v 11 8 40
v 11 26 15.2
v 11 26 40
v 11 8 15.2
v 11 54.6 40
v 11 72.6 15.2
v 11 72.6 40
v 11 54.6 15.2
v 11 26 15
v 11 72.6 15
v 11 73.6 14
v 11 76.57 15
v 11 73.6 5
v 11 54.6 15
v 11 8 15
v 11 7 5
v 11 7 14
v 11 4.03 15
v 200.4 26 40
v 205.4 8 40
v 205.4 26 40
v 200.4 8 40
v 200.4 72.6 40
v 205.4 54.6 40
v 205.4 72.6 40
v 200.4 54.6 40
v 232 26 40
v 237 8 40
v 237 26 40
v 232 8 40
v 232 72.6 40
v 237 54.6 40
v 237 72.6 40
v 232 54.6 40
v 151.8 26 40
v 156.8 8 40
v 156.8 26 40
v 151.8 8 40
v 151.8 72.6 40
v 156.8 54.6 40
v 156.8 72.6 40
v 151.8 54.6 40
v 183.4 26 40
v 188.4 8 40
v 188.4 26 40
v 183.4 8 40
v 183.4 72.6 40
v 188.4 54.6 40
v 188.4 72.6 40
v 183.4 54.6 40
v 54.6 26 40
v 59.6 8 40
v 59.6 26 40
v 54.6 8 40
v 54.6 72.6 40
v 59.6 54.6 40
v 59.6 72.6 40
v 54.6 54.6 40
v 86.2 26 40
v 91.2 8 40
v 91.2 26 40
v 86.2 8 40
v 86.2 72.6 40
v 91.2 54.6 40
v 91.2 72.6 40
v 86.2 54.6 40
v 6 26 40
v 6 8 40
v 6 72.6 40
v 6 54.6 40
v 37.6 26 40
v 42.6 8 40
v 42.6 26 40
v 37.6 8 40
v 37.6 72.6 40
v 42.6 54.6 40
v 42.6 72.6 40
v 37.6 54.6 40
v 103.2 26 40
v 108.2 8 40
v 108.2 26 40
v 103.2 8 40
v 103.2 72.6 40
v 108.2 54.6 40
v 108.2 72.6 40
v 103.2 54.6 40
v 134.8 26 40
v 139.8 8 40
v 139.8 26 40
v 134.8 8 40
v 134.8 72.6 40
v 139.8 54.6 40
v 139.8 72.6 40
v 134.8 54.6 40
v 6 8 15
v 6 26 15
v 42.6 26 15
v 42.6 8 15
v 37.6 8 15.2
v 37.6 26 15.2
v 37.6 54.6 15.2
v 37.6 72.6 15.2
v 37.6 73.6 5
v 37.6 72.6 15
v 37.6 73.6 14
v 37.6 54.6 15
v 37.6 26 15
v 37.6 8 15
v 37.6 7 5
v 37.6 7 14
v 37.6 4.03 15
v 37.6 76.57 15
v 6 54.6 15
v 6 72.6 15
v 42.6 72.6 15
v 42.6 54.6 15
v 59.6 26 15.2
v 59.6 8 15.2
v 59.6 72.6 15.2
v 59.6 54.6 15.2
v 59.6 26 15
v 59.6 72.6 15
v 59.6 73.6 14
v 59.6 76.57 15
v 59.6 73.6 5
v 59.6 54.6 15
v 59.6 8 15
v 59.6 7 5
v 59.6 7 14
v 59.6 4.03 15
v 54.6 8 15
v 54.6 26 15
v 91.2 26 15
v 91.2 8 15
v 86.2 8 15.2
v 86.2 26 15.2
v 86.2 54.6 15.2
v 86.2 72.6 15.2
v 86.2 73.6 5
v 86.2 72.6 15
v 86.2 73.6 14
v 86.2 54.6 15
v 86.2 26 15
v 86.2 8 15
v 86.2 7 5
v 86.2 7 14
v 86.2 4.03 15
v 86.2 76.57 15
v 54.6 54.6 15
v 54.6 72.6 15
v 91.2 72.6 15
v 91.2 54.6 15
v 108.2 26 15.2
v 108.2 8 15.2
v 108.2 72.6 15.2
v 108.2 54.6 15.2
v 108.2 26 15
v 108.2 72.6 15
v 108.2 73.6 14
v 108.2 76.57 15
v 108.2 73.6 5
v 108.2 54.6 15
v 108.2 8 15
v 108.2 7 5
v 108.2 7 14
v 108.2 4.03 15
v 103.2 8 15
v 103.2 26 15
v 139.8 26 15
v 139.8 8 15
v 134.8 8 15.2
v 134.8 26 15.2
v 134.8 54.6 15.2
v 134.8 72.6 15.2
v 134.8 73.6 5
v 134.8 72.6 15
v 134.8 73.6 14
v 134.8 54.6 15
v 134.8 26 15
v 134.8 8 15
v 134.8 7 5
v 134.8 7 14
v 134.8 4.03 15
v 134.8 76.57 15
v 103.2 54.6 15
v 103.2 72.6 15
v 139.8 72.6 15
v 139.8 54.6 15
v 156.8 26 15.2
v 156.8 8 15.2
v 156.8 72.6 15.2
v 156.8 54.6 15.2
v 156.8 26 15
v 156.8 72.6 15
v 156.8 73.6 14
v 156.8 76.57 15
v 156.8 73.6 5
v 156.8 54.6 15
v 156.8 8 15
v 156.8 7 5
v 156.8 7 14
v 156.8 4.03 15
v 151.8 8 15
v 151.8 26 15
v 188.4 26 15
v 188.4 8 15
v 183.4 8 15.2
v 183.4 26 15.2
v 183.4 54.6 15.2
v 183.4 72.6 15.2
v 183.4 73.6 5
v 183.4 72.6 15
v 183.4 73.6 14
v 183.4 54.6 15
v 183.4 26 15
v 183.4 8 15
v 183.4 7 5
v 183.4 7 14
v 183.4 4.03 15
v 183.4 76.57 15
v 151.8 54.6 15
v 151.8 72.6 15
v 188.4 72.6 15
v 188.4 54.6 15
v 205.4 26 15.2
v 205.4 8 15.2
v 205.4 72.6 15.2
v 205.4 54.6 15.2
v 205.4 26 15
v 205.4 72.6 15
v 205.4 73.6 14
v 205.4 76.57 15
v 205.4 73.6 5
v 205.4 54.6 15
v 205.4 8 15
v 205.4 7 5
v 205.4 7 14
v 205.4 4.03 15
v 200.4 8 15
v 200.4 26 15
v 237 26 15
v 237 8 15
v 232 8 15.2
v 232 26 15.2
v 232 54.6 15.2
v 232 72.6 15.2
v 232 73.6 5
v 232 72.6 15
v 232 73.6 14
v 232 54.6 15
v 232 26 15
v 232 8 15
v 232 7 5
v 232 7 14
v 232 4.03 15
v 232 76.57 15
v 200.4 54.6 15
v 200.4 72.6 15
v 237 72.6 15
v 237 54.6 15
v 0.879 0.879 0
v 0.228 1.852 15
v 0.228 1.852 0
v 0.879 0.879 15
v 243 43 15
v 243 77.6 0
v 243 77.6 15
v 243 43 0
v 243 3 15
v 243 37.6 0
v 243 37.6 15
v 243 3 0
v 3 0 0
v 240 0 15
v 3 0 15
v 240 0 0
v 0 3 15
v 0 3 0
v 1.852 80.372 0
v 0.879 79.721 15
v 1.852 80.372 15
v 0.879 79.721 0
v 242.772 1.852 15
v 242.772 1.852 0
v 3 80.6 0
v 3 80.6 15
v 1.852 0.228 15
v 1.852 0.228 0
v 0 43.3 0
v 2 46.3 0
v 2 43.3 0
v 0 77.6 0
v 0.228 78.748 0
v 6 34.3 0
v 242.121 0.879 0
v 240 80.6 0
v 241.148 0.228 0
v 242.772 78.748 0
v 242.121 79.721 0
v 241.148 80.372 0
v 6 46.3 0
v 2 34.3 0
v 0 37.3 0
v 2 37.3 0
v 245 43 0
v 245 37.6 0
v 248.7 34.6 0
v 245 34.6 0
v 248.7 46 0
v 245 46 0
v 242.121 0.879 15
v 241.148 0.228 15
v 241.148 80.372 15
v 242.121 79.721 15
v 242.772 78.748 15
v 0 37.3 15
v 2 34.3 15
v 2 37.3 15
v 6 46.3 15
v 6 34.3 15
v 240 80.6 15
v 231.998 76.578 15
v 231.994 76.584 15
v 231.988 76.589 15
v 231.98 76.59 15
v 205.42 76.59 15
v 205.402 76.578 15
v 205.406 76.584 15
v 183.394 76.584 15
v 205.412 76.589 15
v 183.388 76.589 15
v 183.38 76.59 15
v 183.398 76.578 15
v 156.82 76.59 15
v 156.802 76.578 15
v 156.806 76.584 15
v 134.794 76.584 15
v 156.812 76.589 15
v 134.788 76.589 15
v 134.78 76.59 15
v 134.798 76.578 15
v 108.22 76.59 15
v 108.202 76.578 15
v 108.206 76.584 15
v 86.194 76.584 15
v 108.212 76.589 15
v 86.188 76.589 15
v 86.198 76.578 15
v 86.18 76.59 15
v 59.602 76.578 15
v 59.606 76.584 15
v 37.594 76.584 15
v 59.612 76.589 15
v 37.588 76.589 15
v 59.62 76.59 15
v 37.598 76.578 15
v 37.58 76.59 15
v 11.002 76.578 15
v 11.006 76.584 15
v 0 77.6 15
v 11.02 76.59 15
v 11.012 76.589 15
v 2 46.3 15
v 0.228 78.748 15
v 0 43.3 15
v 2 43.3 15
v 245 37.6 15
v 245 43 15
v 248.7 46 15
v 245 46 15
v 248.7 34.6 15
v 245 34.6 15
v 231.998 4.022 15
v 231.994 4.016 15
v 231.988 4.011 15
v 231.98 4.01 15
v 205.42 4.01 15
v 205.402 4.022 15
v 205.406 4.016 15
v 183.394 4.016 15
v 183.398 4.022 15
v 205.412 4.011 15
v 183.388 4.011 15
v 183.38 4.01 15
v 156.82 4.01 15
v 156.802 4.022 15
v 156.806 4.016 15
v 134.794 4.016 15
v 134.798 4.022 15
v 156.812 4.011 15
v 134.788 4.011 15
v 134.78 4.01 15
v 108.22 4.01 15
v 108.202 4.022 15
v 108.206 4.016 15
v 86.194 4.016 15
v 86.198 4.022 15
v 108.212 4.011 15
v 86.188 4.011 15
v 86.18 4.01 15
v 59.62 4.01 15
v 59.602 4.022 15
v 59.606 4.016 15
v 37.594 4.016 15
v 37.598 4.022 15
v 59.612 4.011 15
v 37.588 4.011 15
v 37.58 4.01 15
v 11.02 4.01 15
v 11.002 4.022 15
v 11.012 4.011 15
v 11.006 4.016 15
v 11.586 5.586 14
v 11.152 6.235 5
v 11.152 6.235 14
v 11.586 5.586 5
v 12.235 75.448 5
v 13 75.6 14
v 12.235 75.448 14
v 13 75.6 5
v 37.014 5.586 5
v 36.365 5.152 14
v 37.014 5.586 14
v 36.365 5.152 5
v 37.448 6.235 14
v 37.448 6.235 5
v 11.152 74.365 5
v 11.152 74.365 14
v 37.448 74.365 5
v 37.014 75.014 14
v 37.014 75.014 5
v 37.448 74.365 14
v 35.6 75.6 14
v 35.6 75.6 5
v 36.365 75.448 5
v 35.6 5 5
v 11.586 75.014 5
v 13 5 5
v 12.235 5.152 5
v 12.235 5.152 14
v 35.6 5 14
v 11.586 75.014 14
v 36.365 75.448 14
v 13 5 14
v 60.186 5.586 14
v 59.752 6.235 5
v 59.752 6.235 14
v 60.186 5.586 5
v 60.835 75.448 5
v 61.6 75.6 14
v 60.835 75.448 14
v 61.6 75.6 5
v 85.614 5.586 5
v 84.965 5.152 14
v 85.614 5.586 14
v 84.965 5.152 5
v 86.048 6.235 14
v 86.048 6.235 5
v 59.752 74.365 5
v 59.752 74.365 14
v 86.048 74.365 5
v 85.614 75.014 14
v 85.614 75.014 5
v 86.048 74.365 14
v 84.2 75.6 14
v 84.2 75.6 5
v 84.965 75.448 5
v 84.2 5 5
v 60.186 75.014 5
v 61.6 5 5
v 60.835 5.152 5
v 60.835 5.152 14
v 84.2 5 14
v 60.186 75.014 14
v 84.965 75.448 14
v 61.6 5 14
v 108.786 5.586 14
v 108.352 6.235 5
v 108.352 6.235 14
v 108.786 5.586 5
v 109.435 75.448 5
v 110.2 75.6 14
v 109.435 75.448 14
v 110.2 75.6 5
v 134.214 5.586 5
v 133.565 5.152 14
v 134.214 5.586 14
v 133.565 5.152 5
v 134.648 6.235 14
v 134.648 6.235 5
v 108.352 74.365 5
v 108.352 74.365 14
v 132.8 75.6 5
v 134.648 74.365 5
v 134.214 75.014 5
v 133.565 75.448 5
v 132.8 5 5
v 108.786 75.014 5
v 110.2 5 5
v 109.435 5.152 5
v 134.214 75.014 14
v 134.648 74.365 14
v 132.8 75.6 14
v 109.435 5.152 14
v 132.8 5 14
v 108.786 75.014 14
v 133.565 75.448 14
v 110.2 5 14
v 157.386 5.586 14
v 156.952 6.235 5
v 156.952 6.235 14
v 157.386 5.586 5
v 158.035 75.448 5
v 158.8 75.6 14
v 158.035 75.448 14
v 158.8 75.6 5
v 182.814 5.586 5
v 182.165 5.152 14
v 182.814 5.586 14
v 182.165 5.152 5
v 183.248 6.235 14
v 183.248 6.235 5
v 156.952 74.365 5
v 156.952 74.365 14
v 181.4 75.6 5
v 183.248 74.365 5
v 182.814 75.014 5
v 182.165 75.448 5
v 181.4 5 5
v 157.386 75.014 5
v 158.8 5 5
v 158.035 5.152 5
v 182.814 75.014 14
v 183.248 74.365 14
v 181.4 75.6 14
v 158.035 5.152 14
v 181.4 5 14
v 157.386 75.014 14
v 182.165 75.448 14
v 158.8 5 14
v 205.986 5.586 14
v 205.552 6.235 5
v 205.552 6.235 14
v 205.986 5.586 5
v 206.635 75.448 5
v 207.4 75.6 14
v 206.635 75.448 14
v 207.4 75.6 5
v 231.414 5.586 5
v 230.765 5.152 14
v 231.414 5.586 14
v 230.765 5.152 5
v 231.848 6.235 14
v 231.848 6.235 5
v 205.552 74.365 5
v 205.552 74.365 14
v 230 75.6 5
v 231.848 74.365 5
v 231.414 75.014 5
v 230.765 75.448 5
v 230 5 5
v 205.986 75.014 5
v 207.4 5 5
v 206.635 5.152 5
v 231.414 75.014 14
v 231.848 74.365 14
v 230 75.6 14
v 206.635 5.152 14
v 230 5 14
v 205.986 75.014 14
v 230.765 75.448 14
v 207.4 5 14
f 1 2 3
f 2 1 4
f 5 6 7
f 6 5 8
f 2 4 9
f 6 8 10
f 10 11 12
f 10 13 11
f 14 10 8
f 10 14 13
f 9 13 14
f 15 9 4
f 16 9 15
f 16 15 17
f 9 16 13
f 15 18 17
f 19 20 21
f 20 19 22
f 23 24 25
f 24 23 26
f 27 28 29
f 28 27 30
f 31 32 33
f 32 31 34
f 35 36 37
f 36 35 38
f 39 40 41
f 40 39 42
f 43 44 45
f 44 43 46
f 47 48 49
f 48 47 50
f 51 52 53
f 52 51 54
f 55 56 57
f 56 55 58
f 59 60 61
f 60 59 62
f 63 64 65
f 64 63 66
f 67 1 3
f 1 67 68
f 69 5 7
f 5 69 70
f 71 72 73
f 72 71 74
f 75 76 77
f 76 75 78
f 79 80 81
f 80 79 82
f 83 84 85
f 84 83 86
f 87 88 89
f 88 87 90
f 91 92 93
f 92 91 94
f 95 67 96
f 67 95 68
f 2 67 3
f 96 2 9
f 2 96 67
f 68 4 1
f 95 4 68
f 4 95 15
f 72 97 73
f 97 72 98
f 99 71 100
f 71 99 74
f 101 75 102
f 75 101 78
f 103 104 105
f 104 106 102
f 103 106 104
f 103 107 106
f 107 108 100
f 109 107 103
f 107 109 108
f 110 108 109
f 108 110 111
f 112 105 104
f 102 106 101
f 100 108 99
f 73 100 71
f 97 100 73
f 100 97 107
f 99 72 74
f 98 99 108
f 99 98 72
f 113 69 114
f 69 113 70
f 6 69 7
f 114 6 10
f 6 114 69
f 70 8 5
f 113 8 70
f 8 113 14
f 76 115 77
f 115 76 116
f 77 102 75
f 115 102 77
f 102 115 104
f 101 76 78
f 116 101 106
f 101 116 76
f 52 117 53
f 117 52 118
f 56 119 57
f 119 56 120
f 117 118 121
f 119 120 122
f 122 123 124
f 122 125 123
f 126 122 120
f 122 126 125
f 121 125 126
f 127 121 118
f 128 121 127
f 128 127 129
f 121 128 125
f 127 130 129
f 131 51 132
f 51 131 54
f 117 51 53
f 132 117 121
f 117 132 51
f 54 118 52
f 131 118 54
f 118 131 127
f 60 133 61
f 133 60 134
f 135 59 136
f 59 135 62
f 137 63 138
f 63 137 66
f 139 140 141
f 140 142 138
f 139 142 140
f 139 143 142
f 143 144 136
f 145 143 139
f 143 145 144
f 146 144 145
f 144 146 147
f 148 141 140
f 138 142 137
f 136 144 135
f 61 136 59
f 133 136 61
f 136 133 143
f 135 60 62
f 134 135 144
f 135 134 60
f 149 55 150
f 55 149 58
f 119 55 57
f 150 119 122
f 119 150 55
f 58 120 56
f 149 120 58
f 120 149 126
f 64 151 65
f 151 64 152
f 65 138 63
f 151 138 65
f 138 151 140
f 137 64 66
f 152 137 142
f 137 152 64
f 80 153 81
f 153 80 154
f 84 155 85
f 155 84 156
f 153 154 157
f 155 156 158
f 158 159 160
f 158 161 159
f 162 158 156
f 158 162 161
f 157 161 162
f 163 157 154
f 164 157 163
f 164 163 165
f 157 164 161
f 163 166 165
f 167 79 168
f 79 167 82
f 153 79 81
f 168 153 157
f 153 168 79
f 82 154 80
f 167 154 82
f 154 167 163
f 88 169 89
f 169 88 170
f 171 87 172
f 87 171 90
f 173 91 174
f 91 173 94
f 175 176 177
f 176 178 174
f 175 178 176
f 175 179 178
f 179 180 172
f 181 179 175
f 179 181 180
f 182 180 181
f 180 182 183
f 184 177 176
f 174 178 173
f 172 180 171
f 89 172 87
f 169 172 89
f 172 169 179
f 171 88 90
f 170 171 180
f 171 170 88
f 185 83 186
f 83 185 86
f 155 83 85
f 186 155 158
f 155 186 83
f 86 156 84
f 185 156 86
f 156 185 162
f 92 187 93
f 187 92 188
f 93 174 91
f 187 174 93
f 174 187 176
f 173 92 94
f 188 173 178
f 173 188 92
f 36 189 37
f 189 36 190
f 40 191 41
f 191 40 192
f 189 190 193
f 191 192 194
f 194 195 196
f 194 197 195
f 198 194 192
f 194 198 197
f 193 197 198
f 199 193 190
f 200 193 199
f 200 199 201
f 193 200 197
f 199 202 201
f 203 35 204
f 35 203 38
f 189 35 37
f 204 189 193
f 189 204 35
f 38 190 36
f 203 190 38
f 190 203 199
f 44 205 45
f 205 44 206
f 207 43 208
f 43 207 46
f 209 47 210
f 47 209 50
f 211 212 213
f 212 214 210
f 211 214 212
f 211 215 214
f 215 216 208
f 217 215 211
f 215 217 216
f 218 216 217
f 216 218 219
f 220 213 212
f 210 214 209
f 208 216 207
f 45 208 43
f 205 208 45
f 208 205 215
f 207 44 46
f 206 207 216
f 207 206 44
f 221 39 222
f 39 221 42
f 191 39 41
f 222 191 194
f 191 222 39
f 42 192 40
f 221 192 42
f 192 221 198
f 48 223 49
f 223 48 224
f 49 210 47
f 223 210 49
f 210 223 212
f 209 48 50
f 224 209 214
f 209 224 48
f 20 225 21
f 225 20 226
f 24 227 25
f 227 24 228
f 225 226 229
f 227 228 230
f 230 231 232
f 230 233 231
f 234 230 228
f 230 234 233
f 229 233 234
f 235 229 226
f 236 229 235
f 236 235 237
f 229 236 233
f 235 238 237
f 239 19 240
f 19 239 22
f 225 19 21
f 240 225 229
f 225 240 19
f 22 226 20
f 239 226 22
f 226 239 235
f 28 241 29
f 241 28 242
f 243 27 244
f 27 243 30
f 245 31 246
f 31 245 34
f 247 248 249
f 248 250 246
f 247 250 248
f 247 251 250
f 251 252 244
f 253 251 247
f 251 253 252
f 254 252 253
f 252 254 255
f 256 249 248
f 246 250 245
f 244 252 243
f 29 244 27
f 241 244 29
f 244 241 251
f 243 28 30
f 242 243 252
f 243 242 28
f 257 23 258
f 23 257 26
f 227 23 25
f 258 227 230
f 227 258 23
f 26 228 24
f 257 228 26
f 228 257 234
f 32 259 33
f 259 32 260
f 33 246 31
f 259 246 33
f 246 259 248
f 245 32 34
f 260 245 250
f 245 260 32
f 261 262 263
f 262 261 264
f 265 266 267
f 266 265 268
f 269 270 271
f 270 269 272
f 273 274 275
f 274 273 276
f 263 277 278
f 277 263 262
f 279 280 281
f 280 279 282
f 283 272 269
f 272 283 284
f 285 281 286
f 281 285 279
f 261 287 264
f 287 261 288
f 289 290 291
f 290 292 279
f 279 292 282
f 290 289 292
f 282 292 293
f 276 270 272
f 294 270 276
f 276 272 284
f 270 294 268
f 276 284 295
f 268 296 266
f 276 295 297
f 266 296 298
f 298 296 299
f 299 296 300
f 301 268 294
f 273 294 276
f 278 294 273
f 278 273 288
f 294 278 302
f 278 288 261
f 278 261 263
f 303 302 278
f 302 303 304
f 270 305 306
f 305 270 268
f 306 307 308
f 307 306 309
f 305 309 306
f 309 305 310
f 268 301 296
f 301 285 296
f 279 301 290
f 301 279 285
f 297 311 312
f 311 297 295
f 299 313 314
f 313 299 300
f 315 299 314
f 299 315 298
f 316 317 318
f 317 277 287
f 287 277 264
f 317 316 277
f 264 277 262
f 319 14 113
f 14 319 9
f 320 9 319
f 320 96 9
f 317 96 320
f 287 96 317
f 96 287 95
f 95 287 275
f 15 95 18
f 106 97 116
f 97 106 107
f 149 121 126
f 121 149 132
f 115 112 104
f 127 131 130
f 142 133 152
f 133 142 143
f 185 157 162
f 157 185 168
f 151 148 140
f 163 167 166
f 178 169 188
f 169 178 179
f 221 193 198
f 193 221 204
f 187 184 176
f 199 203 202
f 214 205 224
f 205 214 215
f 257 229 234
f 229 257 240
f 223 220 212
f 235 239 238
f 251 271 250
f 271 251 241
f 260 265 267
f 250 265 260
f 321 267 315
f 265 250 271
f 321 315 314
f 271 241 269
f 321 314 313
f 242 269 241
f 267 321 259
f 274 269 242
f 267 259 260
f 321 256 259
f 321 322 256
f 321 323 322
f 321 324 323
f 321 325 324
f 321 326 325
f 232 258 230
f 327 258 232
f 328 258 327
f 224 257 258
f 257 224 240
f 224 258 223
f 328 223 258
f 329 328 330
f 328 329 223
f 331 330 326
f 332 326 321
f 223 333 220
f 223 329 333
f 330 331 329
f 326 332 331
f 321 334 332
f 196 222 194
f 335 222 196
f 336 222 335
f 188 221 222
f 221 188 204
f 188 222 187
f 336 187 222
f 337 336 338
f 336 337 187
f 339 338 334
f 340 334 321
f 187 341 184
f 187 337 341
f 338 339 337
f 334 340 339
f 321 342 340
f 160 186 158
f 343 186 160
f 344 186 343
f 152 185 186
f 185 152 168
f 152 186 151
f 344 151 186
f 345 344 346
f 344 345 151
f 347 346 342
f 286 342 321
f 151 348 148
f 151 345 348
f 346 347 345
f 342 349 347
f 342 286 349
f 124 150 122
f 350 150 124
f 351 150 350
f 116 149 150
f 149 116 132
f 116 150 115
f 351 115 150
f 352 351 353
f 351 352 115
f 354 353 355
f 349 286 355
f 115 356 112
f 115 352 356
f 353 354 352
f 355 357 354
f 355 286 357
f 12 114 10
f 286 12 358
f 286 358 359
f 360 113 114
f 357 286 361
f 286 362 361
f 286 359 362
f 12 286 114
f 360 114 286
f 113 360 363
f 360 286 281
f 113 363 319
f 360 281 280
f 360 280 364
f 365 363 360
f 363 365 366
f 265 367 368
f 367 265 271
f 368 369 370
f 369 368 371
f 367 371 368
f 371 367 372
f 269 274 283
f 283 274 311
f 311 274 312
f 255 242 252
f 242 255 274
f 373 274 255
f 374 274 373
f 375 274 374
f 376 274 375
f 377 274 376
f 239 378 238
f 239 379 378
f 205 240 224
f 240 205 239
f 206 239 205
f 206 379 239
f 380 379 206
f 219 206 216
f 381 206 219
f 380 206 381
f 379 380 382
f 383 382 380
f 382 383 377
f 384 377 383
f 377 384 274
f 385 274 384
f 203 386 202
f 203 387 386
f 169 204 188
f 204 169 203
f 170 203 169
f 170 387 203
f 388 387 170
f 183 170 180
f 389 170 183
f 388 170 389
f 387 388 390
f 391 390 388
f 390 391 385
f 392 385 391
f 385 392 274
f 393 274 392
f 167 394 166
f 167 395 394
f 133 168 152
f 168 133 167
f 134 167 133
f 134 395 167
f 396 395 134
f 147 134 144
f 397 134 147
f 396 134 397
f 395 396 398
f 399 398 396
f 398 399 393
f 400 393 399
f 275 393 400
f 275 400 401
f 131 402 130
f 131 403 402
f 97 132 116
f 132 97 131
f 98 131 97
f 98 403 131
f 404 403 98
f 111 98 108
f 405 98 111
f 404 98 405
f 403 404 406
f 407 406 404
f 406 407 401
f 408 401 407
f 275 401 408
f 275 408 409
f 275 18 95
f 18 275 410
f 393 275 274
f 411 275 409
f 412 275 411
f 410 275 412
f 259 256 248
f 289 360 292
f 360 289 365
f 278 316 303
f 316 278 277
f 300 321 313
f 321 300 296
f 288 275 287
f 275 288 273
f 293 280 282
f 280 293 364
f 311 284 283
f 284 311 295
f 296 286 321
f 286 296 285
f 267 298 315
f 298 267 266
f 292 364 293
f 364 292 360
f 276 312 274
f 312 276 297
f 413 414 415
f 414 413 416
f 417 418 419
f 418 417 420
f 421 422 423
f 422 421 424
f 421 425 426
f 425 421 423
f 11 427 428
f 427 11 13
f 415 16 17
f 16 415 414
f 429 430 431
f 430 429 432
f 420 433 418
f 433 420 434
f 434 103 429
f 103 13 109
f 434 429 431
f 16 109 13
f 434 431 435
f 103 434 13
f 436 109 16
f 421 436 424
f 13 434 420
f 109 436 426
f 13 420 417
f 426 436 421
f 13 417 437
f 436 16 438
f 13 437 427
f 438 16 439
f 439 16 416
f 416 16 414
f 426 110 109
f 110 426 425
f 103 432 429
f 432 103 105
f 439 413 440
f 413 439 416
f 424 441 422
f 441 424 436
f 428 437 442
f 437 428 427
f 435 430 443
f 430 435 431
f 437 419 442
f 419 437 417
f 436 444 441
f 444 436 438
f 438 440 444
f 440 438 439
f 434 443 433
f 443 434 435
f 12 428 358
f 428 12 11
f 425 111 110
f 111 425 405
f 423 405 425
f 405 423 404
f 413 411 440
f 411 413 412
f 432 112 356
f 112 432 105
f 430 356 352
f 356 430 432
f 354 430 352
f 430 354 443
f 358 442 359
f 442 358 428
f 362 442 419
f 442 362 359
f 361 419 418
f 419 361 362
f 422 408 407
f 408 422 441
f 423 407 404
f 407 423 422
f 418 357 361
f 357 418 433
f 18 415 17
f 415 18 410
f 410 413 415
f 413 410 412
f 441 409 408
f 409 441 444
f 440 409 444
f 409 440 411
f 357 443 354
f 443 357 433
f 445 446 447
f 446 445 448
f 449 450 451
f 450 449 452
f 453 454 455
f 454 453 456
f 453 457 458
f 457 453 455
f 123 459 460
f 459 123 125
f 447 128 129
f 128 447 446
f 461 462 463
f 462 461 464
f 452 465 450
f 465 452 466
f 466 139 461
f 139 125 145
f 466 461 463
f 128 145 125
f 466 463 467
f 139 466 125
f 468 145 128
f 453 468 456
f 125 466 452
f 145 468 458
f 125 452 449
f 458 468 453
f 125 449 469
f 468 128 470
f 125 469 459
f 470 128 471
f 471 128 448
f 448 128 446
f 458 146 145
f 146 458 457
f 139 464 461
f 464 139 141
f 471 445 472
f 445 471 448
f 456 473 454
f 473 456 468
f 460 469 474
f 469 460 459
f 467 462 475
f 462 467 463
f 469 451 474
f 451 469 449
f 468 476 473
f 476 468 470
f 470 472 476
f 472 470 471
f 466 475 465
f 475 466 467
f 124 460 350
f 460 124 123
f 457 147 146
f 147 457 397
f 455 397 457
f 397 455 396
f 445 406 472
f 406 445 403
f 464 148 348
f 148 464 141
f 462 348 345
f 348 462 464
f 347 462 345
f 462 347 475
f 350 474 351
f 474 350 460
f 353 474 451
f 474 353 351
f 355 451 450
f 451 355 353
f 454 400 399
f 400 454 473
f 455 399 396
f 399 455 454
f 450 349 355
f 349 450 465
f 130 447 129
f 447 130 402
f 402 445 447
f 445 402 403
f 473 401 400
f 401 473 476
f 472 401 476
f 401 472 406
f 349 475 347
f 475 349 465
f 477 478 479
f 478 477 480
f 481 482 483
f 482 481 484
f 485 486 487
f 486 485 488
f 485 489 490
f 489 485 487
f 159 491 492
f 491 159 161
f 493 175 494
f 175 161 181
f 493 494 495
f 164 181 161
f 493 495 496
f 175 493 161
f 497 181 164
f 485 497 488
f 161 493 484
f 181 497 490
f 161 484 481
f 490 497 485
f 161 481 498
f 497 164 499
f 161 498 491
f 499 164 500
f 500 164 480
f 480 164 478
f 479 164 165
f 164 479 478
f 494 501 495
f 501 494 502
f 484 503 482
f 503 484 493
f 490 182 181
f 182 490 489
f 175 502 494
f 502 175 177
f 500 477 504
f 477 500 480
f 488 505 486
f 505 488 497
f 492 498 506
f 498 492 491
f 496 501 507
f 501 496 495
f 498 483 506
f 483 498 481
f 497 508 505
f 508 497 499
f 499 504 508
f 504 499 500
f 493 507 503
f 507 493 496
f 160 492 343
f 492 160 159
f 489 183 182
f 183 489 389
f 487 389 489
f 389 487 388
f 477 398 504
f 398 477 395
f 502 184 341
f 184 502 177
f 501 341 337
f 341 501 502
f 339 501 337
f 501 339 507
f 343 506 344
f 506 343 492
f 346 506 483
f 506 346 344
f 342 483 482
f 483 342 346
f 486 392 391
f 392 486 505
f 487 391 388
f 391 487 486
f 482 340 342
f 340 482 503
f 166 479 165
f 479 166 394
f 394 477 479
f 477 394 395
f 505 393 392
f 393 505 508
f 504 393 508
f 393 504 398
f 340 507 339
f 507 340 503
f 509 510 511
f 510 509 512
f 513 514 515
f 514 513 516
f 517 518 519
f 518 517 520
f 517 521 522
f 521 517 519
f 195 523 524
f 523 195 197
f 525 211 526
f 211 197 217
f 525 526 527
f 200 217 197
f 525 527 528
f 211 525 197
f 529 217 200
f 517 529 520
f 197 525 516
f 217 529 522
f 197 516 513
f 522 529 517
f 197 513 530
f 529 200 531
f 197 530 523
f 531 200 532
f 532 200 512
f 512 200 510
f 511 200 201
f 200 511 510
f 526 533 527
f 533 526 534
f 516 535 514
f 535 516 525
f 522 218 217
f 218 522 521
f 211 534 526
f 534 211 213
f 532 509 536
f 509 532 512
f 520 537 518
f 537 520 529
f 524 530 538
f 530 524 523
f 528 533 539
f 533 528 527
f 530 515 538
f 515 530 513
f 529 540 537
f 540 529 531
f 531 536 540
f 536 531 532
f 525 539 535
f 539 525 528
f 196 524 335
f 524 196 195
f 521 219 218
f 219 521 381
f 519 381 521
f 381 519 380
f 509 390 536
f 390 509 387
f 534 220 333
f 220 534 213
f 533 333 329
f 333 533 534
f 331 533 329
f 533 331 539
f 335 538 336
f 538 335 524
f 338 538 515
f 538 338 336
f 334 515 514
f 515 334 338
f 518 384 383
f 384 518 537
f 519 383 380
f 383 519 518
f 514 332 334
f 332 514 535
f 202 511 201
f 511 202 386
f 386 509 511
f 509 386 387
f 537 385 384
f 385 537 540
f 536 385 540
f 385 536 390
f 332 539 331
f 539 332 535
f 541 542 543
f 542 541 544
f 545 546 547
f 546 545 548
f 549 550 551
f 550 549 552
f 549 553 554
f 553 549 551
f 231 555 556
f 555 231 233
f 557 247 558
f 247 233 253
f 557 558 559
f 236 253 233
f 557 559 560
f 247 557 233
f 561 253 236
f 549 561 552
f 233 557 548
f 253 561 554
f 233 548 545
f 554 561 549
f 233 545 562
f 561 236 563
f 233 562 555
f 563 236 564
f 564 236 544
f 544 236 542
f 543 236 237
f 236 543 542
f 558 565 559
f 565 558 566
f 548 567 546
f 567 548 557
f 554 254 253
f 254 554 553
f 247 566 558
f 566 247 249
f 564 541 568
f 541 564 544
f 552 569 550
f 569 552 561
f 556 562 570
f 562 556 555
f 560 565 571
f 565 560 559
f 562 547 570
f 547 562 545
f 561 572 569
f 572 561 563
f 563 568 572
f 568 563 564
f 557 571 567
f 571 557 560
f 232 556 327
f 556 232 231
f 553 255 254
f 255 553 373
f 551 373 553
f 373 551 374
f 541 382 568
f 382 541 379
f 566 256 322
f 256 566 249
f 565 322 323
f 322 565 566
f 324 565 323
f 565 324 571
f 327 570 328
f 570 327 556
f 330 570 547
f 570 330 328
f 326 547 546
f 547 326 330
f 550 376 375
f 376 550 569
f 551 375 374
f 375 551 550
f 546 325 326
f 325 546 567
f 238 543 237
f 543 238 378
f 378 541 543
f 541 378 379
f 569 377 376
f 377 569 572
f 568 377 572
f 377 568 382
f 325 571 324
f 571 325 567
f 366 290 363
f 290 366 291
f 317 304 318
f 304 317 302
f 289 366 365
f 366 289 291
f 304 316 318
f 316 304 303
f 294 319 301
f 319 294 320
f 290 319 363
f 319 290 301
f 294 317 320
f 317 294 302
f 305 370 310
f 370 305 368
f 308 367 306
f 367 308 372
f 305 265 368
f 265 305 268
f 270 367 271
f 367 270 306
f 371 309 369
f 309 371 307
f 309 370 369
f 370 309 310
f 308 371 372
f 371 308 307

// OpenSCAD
// =============================================================
// router_dock.scad  -  Parametric vertical-slot router dock
// Draft v0.6 / units: mm
// Axes: X = slot row direction, Y = slot length, Z = height
// v0.2: SOLID base -> no bridges, no isolated islands, no stringing
// v0.3: + upright fence slats (modes 1/2, superseded)
// v0.4: independent posts, 4 per slot, front/back open;
//       lead-in chamfer only at the Y ends -> zero unsupported faces
// v0.5: slot width +1 mm along X only; separate-key joint coupons
// v0.6: INTEGRAL male/female joint - LEFT end = female T pocket,
//       RIGHT end = male T tenon. No separate key any more.
//       Tenon length is counted INSIDE the 249 mm envelope so the
//       module still fits the P1S 256 mm bed with 7 mm to spare.
// v0.7: UNIFORM PITCH. The seam clear gap equals M_L + M_R and is
//       INDEPENDENT of GAP, so set M_L + M_R = GAP to make the seam as
//       wide as every internal channel. GAP 25 -> 22, margins 8/2 -> 11/11:
//       envelope stays 249 mm, seam 10 -> 22 mm, and the last slot's right
//       posts regain their full 5 mm (right wall 2 -> 11 mm).
// =============================================================

$fn = 16;

// ---- Print mode ----------------------------------------------
SOLID = 1;   // 1 = solid blind slots (default); 0 = legacy grated + feet
VENT  = 0;   // 1 = solid + standoff pads + open end notches (still no bridges)

// ---- Fence posts (v0.4: independent posts) -------------------
FENCE_ON   = 1;
FENCE_MODE = 3;    // 3 = independent posts, 4 per slot  <-- current design
FENCE_T    = 5;    // post thickness (sketch: 0.5 cm = 5 mm)
FENCE_H    = 25;   // post height ABOVE the slot rim plane (sketch: 2.5 cm)
FENCE_L    = 18;   // post length along the slot (~1/4 of slot length)
FENCE_END  = 3;    // gap from the post outer end to the slot end

// ---- Router / slot (UNCONFIRMED, tune after fit test) --------
SLOT_L      = 70;
SLOT_W      = 25;
SLOT_W_ADD  = 1;     // v0.5: widen the slot by 1 mm along X ONLY
CLEARANCE   = 0.3;   // per-side fit clearance (FDM inner walls shrink)
SLOT_DEPTH  = 10;    // insertion depth; hard max 10 (fan intake)
ROUTER_SHOW = 50;    // exposed height used only by the preview mock-up

// ---- Base ----------------------------------------------------
BASE_T       = 5;    // solid floor thickness (sketch: 0.5 cm)
FOOT_H       = 5;    // legacy only
GAP          = 22;   // v0.7: clear gap between slots. Equals M_L + M_R so
                     // the seam is exactly as wide as an internal channel.
                     // Was 25; reducing it keeps the envelope at 249 mm.
N_SLOTS      = 5;
END_MARGIN   = 11;   // LEFT margin, hosts the 6 mm deep female pocket.
                     // Must stay >= T_DEPTH + 2 or the pocket cuts slot 1.
END_MARGIN_R = 11;   // RIGHT margin behind the male tenon. Must stay >=
                     // FENCE_T (5) or the last slot's right posts get clipped
                     // by the body outline (v0.6 had 2 mm -> thin 2 mm posts).
Y_MARGIN     = 5;
CORNER_R     = 2;
CHAMFER      = 1;

// ---- Integral male/female joint (v0.6) -----------------------
// T-shape locks the modules against being pulled apart along X.
// JOINT_LOCK = 0 switches to a plain rectangular tenon, which can be
// pushed in horizontally but has NO mechanical lock (friction only).
JOINT_LOCK = 1;
T_DEPTH    = 6;      // pocket depth / tenon reach
T_NECK_X   = 2;      // narrow mouth length along X
T_NECK_W   = 6;      // narrow mouth width along Y
T_HEAD_W   = 12;     // wide pocket width along Y
JOINT_GAP  = 0.3;    // per-side clearance of the printed male tenon
// NOTE: the female pocket runs all the way down to z=0. A bottom stop
// ledge would force the tenon to start at z=1 and create a downward
// facing unsupported face. Both modules sit flat on the desk instead.

// ---- Joint fit-test coupon -----------------------------------
JT_X = 10;           // 6 mm pocket/tenon + 4 mm backing wall
JT_Y = 28;           // 12 mm joint + 8 mm wall on each side
JT_GAP_Y = 5;        // spacing between the two coupons in one STL

// ---- VENT option (additive pads + open notches, no bridges) --
PAD_H    = 2;
PAD_W    = 4;
NOTCH_W  = 10;

// ---- Derived (do not edit) -----------------------------------
SW      = SLOT_W + SLOT_W_ADD + 2*CLEARANCE;                  // 26.6
SL      = SLOT_L + 2*CLEARANCE;                               // 70.6
PITCH   = SW + GAP;                                           // 48.6
SLOTS_W = N_SLOTS*SW + (N_SLOTS-1)*GAP;                      // 221
SEAM    = END_MARGIN + END_MARGIN_R;                          // 22 == GAP
BODY_W  = END_MARGIN + SLOTS_W + END_MARGIN_R;                // 243
MW      = BODY_W + T_DEPTH;                                   // 249 incl. tenon
MD      = 2*Y_MARGIN + SL;                                    // 80.6
ZBASE   = SOLID == 1 ? 0 : FOOT_H;
ZB      = ZBASE + BASE_T;                                     // 5
ZT      = ZB + SLOT_DEPTH;                                    // 15
ZF      = ZT + (FENCE_ON == 1 ? FENCE_H : 0);                 // 40
CY      = MD/2;
V0W     = 2*END_MARGIN + SW + GAP;                            // 70.6

// 1 = V0 coupon, 2 = full module (default),
// 4 = fit-test coupon pair, 5 = assembled joint demo.
// PART_ID 3 (separate key) was retired in v0.6.
PART_ID = 2;

// ---- 2D rounded rectangle, extruded --------------------------
module rr(w, d, r) {
    q = min(r, min(w, d)/2 - 0.01);
    hull() {
        translate([q,     q])     circle(q);
        translate([w - q, q])     circle(q);
        translate([q,     d - q]) circle(q);
        translate([w - q, d - q]) circle(q);
    }
}

module rr_box(w, d, h, r) {
    linear_extrude(height = h, convexity = 6) rr(w, d, r);
}

// ---- Slot cavity + lead-in chamfer ---------------------------
module slot_cut(x) {
    translate([x, Y_MARGIN, ZB])
        rr_box(SW, SL, SLOT_DEPTH + 0.2, CORNER_R);
    // Lead-in bevel only at the FRONT / BACK ends of the slot (Y).
    // Widening it along X would cut 1 mm into the posts at z=ZT and
    // leave each post with an unsupported horizontal lip.
    hull() {
        translate([x, Y_MARGIN, ZT - CHAMFER])
            rr_box(SW, SL, 0.01, CORNER_R);
        translate([x, Y_MARGIN - CHAMFER, ZT + 0.01])
            cube([SW, SL + 2*CHAMFER, 0.01]);
    }
}

// ---- Legacy only ---------------------------------------------
module grid_holes(x) {
    for (j = [0:2])
        translate([x + 3 + j*7.5, Y_MARGIN + 5, ZBASE - 0.1])
            rr_box(4, SL - 10, BASE_T + 0.4, 1.2);
}

module vented_rails(W) {
    seg = 20; notch = 8;
    for (x = [0 : seg + notch : W]) {
        w = min(seg, W - x);
        if (w > 2) {
            translate([x, 0, 0])     rr_box(w, 5, FOOT_H + 0.1, 1);
            translate([x, MD-5, 0])  rr_box(w, 5, FOOT_H + 0.1, 1);
        }
    }
}

// ---- Upright fence posts -------------------------------------
module fence_post(W, n, x0) {
    for (i = [0 : n-1]) {
        x = x0 + i*PITCH;
        for (y = [Y_MARGIN + FENCE_END,
                  Y_MARGIN + SL - FENCE_END - FENCE_L]) {
            // Start at the slot FLOOR: a post starting at ZT would have a
            // 1 mm unsupported lip above the mouth chamfer.
            translate([x - FENCE_T, y, ZB])
                cube([FENCE_T, FENCE_L, ZT - ZB + FENCE_H]);
            translate([x + SW, y, ZB])
                cube([FENCE_T, FENCE_L, ZT - ZB + FENCE_H]);
        }
    }
}

module fence(W, n, x0) {
    if (FENCE_ON == 1)
        intersection() {
            translate([0, 0, ZB])
                linear_extrude(height = ZT - ZB + FENCE_H, convexity = 6)
                    rr(W, MD, 3);
            union() {
                if (FENCE_MODE == 3) fence_post(W, n, x0);
            }
        }
}

// ---- Female T pocket at the LEFT end face --------------------
// Through Z = 0 .. ZT. No floor ledge (see NOTE above).
module female_pocket(yc = CY) {
    h = ZT + 0.4;
    if (JOINT_LOCK == 1) {
        translate([-0.2, yc - T_NECK_W/2, -0.2])
            cube([T_NECK_X + 0.2, T_NECK_W, h]);
        translate([T_NECK_X, yc - T_HEAD_W/2, -0.2])
            cube([T_DEPTH - T_NECK_X, T_HEAD_W, h]);
    } else {
        translate([-0.2, yc - T_HEAD_W/2, -0.2])
            cube([T_DEPTH + 0.2, T_HEAD_W, h]);
    }
}

// ---- Male T tenon growing from the RIGHT end face ------------
// X = BODY_W .. BODY_W + (T_DEPTH - JOINT_GAP), Z = 0 .. ZT.
// Every layer is attached to the body at X = BODY_W, so there is no
// overhang; no supports and no separate part are needed.
module male_tenon(x0 = BODY_W, yc = CY) {
    g  = JOINT_GAP;
    nw = T_NECK_W - 2*g;    // 5.4
    hw = T_HEAD_W - 2*g;    // 11.4
    L  = T_DEPTH - g;       // 5.7
    if (JOINT_LOCK == 1) {
        translate([x0, yc - nw/2, 0])
            cube([T_NECK_X, nw, ZT]);
        translate([x0 + T_NECK_X, yc - hw/2, 0])
            cube([L - T_NECK_X, hw, ZT]);
    } else {
        translate([x0, yc - hw/2, 0])
            cube([L, hw, ZT]);
    }
}

// ---- VENT option ---------------------------------------------
module standoff_pads(x) {
    for (px = [x + 1.5, x + SW - 1.5 - PAD_W])
        for (py = [Y_MARGIN + 1.5, Y_MARGIN + SL - 1.5 - PAD_W])
            translate([px, py, ZB])
                rr_box(PAD_W, PAD_W, PAD_H, 0.6);
}

module end_notches(x) {
    nx = x + (SW - NOTCH_W)/2;
    translate([nx, -0.2, ZB])
        cube([NOTCH_W, Y_MARGIN + 1.2, SLOT_DEPTH + 0.2]);
    translate([nx, Y_MARGIN + SL - 1.0, ZB])
        cube([NOTCH_W, Y_MARGIN + 1.2, SLOT_DEPTH + 0.2]);
}

// ---- Body: solid block + fence, all connected ----------------
module body(W, n, x0) {
    union() {
        if (SOLID == 1)
            rr_box(W, MD, ZT, 3);
        else
            union() {
                translate([0, 0, ZBASE]) rr_box(W, MD, ZT - ZBASE, 3);
                vented_rails(W);
            }
        fence(W, n, x0);
    }
}

module cuts(W, n, x0) {
    for (i = [0 : n-1]) {
        x = x0 + i*PITCH;
        slot_cut(x);
        if (SOLID == 0) grid_holes(x);
        if (SOLID == 1 && VENT == 1) end_notches(x);
    }
}

module pads_for(n, x0) {
    if (SOLID == 1 && VENT == 1)
        for (i = [0 : n-1]) standoff_pads(x0 + i*PITCH);
}

// ---- Full 5-slot module: female LEFT + male RIGHT ------------
module full_module() {
    union() {
        difference() {
            body(BODY_W, N_SLOTS, END_MARGIN);
            cuts(BODY_W, N_SLOTS, END_MARGIN);
            female_pocket();
        }
        male_tenon();
        pads_for(N_SLOTS, END_MARGIN);
    }
}

// ---- V0 fit-test coupon: no joint, symmetric margins --------
module v0_test() {
    union() {
        difference() {
            body(V0W, 1, END_MARGIN);
            cuts(V0W, 1, END_MARGIN);
        }
        pads_for(1, END_MARGIN);
    }
}

// ---- Minimal joint fit-test: ONE print yields both pieces ----
// Female coupon: pocket opens toward -X. Male coupon: tenon points +X.
// Put them on the plate side by side; after printing, lift the male
// piece, line the tenon up over the pocket and let it drop in.
module joint_coupon_female() {
    h = ZT + 0.4;
    difference() {
        cube([JT_X, JT_Y, ZT]);
        female_pocket(JT_Y/2);
    }
}

module joint_coupon_male() {
    union() {
        cube([JT_X, JT_Y, ZT]);
        male_tenon(JT_X, JT_Y/2);
    }
}

module joint_fit_test() {
    joint_coupon_female();
    translate([0, JT_Y + JT_GAP_Y, 0]) joint_coupon_male();
}

// Preview-only: fully seated assembly. X is exactly aligned, because a T
// tenon CANNOT be pushed in along X (its wide head would hit the narrow
// mouth); it is dropped in along Z instead. Lifting the demo piece would
// create a fake downward-facing face at the lift height, so the demo stays
// seated and every printed face still rests on z=0. Both solids are the
// same as in joint_fit_test, only relocated -> volumes must add up exactly.
// NOT a printable part.
module joint_pair_demo() {
    translate([-JT_X, 0, 0]) joint_coupon_male();
    joint_coupon_female();
}

// ---- Entry point ---------------------------------------------
if (PART_ID == 1)          v0_test();
else if (PART_ID == 4)     joint_fit_test();
else if (PART_ID == 5)     joint_pair_demo();
else                       full_module();
